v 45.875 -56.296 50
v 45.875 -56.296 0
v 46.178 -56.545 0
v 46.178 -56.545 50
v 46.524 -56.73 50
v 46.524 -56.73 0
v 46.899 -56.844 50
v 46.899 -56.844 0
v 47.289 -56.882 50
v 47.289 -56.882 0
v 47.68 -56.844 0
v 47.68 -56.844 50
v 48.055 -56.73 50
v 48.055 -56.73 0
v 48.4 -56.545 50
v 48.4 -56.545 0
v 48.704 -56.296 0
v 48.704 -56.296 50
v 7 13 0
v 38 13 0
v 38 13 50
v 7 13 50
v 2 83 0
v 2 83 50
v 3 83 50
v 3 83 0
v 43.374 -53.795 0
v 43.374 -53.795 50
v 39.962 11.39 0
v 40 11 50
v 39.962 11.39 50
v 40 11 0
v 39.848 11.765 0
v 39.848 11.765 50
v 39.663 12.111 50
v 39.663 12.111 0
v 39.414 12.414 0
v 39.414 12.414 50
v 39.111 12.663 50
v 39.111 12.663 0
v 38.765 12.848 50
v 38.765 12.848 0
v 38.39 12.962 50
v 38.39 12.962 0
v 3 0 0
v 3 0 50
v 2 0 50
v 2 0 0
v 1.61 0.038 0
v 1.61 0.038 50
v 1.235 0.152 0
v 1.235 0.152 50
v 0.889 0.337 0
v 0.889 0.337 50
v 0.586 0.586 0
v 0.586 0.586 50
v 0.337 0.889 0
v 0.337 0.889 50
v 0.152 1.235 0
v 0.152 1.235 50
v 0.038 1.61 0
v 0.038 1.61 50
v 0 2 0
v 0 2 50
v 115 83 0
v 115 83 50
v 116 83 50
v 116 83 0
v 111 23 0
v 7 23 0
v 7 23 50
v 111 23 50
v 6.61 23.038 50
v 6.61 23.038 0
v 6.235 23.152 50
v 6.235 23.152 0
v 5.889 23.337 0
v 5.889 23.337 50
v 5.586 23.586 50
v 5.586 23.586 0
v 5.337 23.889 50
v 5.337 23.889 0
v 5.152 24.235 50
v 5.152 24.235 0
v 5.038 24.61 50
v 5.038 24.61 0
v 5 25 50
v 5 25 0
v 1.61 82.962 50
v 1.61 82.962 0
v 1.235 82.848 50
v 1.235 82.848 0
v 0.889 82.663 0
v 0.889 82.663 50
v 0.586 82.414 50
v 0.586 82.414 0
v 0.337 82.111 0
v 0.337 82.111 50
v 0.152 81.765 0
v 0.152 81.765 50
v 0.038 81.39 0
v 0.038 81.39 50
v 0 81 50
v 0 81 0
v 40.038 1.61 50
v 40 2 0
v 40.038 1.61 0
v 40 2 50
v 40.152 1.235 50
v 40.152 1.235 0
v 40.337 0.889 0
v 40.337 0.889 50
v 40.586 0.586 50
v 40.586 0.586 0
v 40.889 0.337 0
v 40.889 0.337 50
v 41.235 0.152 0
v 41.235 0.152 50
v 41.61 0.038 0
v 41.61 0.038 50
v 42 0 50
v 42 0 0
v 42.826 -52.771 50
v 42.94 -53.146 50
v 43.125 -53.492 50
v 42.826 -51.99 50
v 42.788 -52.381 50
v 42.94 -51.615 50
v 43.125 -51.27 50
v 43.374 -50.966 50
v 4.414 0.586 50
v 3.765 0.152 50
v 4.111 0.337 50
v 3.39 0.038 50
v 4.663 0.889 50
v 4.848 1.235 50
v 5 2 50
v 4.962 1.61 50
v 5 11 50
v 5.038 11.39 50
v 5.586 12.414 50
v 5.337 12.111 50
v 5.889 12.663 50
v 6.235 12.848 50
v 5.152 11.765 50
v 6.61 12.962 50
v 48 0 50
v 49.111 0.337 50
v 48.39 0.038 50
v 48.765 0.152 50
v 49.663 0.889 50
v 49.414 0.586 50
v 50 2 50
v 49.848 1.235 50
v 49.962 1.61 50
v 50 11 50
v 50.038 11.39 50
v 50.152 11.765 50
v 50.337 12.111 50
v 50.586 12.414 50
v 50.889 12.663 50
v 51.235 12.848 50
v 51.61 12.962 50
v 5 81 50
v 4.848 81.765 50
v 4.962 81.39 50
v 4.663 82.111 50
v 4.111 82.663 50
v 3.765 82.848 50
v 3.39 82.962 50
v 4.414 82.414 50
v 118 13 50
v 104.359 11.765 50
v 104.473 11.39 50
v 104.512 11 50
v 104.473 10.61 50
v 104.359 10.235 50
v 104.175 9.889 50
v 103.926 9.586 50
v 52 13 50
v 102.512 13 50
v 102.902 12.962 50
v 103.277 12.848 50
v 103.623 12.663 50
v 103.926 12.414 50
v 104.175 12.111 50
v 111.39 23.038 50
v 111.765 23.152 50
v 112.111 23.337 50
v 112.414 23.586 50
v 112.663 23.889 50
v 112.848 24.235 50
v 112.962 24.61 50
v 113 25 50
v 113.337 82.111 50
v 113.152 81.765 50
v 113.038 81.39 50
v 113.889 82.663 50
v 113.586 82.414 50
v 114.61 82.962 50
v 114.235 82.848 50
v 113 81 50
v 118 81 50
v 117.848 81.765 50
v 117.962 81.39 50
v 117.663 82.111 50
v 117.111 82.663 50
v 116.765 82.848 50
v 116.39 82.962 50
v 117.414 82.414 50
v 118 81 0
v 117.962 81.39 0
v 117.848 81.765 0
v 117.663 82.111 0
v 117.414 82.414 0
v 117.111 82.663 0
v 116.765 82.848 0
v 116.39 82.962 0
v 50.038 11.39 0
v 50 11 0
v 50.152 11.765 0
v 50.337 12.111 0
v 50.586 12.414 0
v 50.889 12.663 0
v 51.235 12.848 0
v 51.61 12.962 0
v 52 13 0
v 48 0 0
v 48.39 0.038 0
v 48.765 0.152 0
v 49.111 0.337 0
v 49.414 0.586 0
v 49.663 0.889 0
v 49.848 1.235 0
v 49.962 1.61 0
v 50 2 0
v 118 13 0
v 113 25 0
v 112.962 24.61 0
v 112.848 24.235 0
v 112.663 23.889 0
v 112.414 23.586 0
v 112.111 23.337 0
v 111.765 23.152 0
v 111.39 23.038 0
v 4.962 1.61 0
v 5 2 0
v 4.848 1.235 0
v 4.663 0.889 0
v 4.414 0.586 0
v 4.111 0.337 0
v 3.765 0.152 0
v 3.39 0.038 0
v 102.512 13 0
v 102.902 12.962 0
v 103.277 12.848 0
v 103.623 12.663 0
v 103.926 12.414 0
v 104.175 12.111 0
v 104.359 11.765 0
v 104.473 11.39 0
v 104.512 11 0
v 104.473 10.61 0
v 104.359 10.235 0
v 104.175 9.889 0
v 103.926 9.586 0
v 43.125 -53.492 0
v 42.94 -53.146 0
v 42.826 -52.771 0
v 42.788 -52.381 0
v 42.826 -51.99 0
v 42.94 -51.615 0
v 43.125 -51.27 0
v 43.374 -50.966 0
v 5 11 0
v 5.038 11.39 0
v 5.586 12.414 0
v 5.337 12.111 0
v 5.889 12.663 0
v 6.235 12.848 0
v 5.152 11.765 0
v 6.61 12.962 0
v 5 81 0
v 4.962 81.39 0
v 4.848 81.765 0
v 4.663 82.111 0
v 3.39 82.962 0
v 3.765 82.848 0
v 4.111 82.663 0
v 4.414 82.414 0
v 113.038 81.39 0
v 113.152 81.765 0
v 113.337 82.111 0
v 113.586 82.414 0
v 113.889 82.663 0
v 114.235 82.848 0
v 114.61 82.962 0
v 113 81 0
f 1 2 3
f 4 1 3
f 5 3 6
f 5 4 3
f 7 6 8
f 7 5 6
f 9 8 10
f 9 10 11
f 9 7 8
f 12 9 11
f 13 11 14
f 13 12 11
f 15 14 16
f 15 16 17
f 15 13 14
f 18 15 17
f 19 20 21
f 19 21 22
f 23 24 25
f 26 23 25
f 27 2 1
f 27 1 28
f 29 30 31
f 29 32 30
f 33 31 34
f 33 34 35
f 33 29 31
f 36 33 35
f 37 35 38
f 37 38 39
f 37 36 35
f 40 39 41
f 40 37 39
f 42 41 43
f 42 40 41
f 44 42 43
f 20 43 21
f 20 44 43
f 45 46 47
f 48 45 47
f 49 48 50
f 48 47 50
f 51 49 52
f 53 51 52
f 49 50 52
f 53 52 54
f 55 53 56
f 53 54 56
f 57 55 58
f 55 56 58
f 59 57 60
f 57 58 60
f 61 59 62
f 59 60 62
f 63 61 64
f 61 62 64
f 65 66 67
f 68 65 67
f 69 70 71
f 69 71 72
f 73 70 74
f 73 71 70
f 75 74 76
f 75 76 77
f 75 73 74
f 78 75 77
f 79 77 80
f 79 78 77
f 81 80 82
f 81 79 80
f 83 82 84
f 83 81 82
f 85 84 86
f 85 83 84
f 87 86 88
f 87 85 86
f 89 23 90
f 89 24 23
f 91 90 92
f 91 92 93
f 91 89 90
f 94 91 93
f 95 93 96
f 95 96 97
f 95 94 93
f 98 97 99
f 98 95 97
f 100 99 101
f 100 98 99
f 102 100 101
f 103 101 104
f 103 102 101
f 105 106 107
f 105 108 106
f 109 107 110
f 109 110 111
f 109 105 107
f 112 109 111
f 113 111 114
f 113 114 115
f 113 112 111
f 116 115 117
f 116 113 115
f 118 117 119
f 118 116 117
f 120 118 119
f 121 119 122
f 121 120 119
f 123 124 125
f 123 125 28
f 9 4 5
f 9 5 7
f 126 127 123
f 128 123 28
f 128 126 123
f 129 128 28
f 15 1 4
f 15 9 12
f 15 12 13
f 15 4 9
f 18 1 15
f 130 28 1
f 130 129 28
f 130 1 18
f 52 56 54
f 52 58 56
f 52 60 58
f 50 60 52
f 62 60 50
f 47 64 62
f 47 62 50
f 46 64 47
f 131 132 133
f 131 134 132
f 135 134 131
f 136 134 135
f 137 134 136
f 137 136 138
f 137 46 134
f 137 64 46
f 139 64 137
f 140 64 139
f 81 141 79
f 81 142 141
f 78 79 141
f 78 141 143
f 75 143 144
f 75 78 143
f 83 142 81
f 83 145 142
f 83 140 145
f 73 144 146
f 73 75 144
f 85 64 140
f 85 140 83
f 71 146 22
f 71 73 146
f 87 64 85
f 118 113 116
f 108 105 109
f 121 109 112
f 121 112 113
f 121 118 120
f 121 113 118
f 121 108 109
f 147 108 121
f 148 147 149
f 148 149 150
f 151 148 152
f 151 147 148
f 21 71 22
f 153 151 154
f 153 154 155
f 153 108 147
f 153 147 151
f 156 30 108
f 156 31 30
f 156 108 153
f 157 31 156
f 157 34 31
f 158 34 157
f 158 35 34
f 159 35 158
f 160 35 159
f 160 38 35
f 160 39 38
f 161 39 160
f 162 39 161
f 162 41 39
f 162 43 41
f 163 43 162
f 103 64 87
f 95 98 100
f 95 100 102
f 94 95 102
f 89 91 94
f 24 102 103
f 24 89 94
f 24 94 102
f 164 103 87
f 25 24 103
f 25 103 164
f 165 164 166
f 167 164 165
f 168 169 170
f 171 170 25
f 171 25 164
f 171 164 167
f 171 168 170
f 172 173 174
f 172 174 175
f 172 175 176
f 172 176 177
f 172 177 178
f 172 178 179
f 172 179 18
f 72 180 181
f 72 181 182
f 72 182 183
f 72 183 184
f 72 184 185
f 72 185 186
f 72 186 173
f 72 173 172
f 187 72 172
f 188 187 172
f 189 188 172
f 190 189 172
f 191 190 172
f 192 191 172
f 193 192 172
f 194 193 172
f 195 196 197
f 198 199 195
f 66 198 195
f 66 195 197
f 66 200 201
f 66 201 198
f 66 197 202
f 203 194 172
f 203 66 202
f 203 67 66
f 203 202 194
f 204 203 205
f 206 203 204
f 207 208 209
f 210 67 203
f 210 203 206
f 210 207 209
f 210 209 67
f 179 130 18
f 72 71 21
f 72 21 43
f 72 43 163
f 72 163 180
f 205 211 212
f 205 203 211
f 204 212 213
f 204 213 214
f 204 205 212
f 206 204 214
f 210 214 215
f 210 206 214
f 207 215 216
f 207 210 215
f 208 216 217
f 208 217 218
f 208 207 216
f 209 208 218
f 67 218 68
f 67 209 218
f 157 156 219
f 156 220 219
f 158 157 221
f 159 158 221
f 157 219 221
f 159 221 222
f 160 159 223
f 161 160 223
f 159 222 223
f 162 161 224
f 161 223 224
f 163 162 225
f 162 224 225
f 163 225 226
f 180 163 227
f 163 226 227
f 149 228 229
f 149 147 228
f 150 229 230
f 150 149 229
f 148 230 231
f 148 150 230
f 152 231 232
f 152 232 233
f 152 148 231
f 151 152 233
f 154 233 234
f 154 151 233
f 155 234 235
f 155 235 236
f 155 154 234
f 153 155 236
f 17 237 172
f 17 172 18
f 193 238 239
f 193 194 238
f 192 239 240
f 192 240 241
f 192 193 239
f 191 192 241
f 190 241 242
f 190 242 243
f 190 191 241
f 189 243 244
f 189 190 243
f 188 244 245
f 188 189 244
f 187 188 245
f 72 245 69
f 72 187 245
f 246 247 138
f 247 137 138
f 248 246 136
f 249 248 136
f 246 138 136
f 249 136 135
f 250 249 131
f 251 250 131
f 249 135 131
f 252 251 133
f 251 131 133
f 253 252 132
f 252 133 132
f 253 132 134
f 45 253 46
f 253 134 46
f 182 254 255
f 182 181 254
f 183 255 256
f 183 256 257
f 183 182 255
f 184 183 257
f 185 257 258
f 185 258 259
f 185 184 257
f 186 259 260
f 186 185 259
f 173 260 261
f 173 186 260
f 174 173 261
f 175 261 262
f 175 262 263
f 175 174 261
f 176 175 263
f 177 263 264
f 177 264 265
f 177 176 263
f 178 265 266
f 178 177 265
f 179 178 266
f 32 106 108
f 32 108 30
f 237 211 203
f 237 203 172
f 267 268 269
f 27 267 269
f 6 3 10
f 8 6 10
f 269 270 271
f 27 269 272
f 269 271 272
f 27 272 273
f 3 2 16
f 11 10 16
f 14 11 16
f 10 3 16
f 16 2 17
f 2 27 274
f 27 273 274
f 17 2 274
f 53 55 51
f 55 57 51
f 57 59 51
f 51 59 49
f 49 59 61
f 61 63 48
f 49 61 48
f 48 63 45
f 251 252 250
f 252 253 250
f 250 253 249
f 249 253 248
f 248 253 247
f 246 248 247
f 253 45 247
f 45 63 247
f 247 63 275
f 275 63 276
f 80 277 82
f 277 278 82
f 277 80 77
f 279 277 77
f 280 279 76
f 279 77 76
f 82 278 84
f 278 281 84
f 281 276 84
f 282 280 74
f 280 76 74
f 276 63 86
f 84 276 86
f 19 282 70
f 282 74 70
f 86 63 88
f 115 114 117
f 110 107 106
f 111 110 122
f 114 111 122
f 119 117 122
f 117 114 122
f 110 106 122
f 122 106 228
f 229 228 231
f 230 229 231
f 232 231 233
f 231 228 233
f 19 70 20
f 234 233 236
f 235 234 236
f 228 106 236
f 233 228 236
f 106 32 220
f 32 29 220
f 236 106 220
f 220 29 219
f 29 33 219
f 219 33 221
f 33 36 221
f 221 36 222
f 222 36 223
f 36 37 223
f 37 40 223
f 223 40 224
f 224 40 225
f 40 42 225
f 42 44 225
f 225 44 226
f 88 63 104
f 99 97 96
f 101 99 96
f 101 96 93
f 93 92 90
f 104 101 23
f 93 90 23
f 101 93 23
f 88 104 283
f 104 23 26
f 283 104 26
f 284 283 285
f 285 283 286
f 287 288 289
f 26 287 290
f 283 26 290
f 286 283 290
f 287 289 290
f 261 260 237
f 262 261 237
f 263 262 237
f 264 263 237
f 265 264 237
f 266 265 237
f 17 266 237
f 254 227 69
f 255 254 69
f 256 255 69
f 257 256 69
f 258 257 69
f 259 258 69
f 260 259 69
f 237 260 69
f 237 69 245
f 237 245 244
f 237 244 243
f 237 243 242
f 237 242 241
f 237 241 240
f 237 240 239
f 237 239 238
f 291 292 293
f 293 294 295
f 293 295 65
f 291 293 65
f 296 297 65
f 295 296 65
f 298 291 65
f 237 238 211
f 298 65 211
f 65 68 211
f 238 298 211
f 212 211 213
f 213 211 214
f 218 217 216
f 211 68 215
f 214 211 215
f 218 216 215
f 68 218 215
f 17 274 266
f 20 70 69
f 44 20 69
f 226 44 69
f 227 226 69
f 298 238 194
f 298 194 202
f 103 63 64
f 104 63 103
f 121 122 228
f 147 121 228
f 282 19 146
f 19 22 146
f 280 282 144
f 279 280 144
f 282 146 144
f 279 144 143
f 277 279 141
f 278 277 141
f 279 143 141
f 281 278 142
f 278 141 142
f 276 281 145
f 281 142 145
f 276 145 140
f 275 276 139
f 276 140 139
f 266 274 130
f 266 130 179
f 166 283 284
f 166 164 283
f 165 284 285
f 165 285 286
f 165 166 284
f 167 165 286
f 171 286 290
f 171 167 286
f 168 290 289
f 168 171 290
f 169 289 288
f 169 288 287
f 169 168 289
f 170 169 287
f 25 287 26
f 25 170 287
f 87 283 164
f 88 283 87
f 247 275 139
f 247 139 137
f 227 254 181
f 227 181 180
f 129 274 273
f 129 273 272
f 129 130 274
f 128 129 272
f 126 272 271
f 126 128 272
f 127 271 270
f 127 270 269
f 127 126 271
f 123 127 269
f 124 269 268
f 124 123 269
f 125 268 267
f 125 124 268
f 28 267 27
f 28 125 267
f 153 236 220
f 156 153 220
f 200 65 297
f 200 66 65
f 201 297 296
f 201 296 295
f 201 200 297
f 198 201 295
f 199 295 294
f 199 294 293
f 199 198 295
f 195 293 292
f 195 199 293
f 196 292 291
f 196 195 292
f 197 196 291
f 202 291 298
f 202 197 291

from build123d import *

# Parameters (mm, degrees)
BOX_W     = 10
BOX_H     = 17
BOX_DEPTH = 50
PAD_DEPTH = 50
FILLET_R  = 2


with BuildPart() as cube:
    # Box → Box (new body)
    with BuildSketch(Plane(origin=(40, 0, 0), x_dir=(1, 0, 0), z_dir=(0, 0, 1))):
        with Locations((5, 8.5)):
            Rectangle(BOX_W, BOX_H)
    extrude(amount=BOX_DEPTH)


with BuildPart() as fillet_body:
    # Sketch → Pad (new body)
    with BuildSketch(Plane.XY):
        Polygon((0, 0), (0, 83), (5, 83), (5, 23), (113, 23), (113, 83), (118, 83), (118, 13), (47.289322, -57.710678), (41.959322, -52.380678), (107.34, 13), (5, 13), (5, 0), align=None)
    extrude(amount=PAD_DEPTH)

    # Fusion: union Cube
    add(cube.part)

    # Fillet
    fillet_edges = [fillet_body.edges().sort_by_distance(p)[0] for p in [
        (0, 0, 25),
        (0, 83, 25),
        (5, 0, 25),
        (5, 83, 25),
        (5, 13, 25),
        (5, 23, 25),
        (113, 23, 25),
        (113, 83, 25),
        (118, 83, 25),
        (47.289322, -57.710678, 25),
        (41.959322, -52.380678, 25),
        (107.34, 13, 25),
        (50, 13, 25),
        (40, 13, 25),
        (50, 0, 25),
        (40, 0, 25),
    ]]
    fillet(fillet_edges, radius=FILLET_R)


solid = fillet_body.part
